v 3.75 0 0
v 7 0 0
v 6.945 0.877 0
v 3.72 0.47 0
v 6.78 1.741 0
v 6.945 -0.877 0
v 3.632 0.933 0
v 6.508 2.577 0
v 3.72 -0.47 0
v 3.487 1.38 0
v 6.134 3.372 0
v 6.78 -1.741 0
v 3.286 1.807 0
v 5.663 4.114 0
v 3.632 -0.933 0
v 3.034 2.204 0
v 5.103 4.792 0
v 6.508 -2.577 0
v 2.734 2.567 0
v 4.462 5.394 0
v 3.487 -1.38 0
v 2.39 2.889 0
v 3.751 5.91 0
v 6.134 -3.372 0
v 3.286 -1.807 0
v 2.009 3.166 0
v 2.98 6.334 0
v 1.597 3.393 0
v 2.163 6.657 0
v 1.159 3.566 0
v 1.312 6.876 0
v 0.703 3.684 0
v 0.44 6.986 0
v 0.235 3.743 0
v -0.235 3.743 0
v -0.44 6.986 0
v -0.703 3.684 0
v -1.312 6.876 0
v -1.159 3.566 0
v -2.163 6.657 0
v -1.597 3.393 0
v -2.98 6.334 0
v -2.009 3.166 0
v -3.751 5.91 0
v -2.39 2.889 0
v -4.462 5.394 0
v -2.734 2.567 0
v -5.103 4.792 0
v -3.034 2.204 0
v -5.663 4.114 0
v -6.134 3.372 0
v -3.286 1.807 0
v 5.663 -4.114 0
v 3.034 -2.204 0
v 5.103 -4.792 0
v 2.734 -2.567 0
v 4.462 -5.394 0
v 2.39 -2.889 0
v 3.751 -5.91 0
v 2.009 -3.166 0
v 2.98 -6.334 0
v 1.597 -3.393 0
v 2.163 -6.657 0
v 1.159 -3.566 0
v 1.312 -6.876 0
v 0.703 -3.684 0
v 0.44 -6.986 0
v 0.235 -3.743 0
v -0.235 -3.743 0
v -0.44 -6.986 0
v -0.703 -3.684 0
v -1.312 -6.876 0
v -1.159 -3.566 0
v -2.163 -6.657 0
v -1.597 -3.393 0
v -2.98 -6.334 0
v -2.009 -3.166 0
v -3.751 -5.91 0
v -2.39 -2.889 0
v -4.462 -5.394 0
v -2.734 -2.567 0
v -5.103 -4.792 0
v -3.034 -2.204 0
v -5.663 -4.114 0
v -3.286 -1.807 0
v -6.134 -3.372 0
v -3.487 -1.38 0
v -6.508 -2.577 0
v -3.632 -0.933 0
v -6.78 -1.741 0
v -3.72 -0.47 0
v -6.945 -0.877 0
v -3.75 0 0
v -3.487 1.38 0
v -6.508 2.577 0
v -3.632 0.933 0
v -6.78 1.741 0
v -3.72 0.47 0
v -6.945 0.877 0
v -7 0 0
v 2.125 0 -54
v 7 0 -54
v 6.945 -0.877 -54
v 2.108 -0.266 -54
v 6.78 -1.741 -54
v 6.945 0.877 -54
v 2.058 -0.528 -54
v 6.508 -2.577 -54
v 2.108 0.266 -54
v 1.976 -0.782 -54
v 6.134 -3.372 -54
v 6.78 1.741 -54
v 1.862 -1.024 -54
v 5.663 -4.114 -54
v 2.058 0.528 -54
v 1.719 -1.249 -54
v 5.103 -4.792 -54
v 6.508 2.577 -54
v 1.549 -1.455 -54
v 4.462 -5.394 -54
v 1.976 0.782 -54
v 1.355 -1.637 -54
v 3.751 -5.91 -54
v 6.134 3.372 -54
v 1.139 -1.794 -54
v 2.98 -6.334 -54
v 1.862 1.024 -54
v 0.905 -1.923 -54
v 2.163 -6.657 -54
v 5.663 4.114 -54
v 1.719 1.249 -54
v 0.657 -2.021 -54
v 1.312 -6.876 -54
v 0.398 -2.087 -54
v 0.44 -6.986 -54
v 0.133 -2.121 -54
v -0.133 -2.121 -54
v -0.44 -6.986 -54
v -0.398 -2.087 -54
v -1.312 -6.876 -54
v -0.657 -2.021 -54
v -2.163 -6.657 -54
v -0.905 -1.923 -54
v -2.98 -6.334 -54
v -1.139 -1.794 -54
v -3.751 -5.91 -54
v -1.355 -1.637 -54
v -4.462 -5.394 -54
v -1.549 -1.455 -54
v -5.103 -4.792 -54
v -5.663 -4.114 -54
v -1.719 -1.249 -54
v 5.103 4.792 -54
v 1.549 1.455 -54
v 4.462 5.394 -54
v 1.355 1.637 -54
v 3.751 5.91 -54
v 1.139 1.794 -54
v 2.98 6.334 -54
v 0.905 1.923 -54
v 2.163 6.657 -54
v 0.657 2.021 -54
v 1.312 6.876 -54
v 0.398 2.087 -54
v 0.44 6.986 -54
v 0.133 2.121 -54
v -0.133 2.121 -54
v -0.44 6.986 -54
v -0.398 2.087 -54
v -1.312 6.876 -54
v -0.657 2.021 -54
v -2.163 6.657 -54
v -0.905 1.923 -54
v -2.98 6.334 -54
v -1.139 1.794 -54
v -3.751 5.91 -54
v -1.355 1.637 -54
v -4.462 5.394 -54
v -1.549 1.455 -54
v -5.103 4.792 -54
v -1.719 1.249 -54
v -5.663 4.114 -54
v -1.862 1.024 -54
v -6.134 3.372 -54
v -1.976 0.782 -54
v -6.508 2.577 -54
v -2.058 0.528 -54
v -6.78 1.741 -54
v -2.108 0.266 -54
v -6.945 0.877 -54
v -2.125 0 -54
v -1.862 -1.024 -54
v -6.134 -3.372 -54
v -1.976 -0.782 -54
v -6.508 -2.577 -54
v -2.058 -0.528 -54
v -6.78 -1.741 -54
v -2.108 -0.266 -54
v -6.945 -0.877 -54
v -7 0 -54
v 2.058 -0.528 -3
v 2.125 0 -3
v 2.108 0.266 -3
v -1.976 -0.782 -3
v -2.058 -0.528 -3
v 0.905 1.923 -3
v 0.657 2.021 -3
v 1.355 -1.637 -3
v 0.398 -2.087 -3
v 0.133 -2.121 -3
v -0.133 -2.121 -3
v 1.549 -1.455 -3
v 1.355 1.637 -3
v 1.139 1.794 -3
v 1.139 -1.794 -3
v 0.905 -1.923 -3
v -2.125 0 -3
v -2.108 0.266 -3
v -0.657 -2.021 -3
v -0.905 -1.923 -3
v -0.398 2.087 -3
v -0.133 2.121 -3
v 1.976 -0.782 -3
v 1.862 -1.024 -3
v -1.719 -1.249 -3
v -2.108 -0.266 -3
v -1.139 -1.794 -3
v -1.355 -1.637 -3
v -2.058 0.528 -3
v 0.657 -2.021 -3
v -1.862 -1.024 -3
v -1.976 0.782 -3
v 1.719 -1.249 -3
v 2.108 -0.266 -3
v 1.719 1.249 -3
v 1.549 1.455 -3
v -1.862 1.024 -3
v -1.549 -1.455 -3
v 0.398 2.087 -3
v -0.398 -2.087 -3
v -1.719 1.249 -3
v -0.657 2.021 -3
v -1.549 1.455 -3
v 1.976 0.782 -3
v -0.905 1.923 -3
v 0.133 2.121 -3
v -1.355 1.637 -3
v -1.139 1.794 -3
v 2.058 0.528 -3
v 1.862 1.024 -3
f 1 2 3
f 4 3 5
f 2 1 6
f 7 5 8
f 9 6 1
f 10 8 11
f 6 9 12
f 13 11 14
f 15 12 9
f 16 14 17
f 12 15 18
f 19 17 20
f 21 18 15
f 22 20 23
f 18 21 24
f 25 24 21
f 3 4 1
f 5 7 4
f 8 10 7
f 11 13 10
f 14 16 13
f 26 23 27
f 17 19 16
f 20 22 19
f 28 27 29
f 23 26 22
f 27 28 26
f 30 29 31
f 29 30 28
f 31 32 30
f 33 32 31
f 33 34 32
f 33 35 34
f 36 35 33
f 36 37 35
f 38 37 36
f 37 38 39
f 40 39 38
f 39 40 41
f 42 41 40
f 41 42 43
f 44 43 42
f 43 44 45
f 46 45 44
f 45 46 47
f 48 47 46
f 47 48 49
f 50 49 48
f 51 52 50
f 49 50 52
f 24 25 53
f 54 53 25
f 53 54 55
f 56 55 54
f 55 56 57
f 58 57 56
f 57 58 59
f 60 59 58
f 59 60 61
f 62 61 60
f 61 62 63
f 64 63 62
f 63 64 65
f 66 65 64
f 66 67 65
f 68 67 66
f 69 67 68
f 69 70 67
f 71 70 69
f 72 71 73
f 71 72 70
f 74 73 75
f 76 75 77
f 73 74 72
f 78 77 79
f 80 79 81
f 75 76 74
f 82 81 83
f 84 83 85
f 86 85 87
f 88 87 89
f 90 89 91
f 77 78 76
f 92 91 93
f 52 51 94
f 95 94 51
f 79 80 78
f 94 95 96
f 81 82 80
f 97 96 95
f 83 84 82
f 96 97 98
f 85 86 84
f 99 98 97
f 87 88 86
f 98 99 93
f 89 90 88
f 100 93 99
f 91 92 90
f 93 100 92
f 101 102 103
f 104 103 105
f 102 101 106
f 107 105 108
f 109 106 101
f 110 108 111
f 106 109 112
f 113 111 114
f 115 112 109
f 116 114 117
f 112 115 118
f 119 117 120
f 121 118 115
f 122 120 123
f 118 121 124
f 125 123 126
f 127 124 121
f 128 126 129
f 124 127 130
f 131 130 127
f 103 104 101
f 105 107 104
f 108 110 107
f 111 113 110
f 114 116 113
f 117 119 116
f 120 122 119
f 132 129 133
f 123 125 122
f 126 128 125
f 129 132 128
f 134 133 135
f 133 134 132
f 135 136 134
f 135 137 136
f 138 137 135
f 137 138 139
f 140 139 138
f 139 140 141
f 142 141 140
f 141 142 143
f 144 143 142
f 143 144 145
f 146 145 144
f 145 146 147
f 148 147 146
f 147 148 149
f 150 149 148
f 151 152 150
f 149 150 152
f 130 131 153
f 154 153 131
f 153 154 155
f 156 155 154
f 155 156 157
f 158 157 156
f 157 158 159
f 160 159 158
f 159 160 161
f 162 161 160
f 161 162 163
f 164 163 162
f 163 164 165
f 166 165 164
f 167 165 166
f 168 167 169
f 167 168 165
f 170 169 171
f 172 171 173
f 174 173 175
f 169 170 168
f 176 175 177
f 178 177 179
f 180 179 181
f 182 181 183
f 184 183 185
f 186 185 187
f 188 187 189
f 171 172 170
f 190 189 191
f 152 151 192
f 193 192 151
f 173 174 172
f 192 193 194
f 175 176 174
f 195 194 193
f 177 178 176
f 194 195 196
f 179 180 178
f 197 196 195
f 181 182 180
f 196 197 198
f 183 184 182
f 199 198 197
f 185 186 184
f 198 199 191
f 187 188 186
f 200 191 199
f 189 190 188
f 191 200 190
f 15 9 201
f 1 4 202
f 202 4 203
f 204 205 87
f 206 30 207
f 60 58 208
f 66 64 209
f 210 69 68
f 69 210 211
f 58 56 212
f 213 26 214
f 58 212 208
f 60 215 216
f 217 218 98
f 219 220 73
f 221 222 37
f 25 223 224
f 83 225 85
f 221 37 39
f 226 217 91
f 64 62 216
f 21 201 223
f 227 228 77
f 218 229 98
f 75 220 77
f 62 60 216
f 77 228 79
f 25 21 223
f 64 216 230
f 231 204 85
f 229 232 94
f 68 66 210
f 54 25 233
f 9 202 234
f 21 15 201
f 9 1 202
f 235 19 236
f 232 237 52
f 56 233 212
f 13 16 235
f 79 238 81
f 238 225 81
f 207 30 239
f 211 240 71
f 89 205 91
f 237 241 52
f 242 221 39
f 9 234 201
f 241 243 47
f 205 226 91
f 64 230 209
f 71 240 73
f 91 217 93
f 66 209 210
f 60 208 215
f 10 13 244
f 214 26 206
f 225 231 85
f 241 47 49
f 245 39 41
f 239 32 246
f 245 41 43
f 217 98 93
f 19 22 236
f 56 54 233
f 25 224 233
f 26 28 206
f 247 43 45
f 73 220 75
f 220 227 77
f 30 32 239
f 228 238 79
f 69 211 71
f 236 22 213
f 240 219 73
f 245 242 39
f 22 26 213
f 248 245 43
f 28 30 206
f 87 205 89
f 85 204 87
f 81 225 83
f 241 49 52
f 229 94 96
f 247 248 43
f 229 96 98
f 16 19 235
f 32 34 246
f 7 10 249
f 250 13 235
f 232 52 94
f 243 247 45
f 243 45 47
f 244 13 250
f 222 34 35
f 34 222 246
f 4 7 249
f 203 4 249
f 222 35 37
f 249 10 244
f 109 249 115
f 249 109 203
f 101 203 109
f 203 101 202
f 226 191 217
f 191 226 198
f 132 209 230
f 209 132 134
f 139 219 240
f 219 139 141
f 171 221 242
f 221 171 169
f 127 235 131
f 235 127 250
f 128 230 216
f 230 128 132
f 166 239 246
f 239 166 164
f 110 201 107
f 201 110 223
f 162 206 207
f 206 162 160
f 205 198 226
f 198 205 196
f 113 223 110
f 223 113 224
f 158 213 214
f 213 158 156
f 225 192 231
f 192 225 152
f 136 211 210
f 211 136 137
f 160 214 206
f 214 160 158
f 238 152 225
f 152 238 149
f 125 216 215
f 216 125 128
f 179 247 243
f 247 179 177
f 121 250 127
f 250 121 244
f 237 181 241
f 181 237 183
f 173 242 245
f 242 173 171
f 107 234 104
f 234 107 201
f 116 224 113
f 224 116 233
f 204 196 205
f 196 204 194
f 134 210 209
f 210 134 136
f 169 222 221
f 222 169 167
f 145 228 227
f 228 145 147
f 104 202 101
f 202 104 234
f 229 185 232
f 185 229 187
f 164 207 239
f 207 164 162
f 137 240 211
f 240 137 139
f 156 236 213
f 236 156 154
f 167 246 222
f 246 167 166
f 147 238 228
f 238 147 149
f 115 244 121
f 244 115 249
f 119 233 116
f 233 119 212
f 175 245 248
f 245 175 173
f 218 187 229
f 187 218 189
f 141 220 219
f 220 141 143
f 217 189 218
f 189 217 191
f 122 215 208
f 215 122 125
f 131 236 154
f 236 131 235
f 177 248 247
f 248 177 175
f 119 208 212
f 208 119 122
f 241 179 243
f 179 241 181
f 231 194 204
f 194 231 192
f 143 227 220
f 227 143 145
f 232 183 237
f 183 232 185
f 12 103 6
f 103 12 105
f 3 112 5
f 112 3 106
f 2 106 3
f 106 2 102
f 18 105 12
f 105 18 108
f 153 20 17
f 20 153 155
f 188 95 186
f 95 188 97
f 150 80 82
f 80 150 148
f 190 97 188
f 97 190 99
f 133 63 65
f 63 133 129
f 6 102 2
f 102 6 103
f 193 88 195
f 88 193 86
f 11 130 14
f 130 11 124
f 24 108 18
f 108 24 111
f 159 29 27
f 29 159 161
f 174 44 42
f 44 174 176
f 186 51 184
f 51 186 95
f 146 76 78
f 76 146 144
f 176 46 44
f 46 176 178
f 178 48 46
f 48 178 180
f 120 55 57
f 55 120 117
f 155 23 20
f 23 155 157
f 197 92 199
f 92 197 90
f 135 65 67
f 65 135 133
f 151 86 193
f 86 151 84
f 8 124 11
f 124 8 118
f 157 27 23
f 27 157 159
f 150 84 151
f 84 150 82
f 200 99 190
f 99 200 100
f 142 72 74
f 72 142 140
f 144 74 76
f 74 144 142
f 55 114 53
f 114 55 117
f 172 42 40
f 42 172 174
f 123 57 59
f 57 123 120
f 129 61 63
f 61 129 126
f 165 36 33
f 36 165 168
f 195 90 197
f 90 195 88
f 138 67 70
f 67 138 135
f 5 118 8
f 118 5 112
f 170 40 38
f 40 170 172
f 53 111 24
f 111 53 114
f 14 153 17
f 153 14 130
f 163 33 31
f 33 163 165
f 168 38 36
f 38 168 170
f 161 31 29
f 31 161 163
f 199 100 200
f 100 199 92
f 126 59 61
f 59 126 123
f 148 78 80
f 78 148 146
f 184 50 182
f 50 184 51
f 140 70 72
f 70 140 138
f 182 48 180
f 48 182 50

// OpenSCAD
$fn = 50;


difference() {
	union() {
		translate(v = [0, 0, -54.0000000000]) {
			cylinder(h = 54, r = 7.0000000000);
		}
	}
	union() {
		translate(v = [0, 0, 0]) {
			rotate(a = [0, 0, 0]) {
				difference() {
					union() {
						#translate(v = [0, 0, -54.0000000000]) {
							cylinder(h = 54, r = 2.0000000000);
						}
						#translate(v = [0, 0, -3]) {
							cylinder(h = 3, r = 7.0000000000, r1 = 2.1250000000, r2 = 3.7500000000);
						}
						#translate(v = [0, 0, -54.0000000000]) {
							cylinder(h = 54, r = 2.1250000000);
						}
						#translate(v = [0, 0, -54.0000000000]) {
							cylinder(h = 54, r = 2.0000000000);
						}
					}
					union();
				}
			}
		}
	}
}
